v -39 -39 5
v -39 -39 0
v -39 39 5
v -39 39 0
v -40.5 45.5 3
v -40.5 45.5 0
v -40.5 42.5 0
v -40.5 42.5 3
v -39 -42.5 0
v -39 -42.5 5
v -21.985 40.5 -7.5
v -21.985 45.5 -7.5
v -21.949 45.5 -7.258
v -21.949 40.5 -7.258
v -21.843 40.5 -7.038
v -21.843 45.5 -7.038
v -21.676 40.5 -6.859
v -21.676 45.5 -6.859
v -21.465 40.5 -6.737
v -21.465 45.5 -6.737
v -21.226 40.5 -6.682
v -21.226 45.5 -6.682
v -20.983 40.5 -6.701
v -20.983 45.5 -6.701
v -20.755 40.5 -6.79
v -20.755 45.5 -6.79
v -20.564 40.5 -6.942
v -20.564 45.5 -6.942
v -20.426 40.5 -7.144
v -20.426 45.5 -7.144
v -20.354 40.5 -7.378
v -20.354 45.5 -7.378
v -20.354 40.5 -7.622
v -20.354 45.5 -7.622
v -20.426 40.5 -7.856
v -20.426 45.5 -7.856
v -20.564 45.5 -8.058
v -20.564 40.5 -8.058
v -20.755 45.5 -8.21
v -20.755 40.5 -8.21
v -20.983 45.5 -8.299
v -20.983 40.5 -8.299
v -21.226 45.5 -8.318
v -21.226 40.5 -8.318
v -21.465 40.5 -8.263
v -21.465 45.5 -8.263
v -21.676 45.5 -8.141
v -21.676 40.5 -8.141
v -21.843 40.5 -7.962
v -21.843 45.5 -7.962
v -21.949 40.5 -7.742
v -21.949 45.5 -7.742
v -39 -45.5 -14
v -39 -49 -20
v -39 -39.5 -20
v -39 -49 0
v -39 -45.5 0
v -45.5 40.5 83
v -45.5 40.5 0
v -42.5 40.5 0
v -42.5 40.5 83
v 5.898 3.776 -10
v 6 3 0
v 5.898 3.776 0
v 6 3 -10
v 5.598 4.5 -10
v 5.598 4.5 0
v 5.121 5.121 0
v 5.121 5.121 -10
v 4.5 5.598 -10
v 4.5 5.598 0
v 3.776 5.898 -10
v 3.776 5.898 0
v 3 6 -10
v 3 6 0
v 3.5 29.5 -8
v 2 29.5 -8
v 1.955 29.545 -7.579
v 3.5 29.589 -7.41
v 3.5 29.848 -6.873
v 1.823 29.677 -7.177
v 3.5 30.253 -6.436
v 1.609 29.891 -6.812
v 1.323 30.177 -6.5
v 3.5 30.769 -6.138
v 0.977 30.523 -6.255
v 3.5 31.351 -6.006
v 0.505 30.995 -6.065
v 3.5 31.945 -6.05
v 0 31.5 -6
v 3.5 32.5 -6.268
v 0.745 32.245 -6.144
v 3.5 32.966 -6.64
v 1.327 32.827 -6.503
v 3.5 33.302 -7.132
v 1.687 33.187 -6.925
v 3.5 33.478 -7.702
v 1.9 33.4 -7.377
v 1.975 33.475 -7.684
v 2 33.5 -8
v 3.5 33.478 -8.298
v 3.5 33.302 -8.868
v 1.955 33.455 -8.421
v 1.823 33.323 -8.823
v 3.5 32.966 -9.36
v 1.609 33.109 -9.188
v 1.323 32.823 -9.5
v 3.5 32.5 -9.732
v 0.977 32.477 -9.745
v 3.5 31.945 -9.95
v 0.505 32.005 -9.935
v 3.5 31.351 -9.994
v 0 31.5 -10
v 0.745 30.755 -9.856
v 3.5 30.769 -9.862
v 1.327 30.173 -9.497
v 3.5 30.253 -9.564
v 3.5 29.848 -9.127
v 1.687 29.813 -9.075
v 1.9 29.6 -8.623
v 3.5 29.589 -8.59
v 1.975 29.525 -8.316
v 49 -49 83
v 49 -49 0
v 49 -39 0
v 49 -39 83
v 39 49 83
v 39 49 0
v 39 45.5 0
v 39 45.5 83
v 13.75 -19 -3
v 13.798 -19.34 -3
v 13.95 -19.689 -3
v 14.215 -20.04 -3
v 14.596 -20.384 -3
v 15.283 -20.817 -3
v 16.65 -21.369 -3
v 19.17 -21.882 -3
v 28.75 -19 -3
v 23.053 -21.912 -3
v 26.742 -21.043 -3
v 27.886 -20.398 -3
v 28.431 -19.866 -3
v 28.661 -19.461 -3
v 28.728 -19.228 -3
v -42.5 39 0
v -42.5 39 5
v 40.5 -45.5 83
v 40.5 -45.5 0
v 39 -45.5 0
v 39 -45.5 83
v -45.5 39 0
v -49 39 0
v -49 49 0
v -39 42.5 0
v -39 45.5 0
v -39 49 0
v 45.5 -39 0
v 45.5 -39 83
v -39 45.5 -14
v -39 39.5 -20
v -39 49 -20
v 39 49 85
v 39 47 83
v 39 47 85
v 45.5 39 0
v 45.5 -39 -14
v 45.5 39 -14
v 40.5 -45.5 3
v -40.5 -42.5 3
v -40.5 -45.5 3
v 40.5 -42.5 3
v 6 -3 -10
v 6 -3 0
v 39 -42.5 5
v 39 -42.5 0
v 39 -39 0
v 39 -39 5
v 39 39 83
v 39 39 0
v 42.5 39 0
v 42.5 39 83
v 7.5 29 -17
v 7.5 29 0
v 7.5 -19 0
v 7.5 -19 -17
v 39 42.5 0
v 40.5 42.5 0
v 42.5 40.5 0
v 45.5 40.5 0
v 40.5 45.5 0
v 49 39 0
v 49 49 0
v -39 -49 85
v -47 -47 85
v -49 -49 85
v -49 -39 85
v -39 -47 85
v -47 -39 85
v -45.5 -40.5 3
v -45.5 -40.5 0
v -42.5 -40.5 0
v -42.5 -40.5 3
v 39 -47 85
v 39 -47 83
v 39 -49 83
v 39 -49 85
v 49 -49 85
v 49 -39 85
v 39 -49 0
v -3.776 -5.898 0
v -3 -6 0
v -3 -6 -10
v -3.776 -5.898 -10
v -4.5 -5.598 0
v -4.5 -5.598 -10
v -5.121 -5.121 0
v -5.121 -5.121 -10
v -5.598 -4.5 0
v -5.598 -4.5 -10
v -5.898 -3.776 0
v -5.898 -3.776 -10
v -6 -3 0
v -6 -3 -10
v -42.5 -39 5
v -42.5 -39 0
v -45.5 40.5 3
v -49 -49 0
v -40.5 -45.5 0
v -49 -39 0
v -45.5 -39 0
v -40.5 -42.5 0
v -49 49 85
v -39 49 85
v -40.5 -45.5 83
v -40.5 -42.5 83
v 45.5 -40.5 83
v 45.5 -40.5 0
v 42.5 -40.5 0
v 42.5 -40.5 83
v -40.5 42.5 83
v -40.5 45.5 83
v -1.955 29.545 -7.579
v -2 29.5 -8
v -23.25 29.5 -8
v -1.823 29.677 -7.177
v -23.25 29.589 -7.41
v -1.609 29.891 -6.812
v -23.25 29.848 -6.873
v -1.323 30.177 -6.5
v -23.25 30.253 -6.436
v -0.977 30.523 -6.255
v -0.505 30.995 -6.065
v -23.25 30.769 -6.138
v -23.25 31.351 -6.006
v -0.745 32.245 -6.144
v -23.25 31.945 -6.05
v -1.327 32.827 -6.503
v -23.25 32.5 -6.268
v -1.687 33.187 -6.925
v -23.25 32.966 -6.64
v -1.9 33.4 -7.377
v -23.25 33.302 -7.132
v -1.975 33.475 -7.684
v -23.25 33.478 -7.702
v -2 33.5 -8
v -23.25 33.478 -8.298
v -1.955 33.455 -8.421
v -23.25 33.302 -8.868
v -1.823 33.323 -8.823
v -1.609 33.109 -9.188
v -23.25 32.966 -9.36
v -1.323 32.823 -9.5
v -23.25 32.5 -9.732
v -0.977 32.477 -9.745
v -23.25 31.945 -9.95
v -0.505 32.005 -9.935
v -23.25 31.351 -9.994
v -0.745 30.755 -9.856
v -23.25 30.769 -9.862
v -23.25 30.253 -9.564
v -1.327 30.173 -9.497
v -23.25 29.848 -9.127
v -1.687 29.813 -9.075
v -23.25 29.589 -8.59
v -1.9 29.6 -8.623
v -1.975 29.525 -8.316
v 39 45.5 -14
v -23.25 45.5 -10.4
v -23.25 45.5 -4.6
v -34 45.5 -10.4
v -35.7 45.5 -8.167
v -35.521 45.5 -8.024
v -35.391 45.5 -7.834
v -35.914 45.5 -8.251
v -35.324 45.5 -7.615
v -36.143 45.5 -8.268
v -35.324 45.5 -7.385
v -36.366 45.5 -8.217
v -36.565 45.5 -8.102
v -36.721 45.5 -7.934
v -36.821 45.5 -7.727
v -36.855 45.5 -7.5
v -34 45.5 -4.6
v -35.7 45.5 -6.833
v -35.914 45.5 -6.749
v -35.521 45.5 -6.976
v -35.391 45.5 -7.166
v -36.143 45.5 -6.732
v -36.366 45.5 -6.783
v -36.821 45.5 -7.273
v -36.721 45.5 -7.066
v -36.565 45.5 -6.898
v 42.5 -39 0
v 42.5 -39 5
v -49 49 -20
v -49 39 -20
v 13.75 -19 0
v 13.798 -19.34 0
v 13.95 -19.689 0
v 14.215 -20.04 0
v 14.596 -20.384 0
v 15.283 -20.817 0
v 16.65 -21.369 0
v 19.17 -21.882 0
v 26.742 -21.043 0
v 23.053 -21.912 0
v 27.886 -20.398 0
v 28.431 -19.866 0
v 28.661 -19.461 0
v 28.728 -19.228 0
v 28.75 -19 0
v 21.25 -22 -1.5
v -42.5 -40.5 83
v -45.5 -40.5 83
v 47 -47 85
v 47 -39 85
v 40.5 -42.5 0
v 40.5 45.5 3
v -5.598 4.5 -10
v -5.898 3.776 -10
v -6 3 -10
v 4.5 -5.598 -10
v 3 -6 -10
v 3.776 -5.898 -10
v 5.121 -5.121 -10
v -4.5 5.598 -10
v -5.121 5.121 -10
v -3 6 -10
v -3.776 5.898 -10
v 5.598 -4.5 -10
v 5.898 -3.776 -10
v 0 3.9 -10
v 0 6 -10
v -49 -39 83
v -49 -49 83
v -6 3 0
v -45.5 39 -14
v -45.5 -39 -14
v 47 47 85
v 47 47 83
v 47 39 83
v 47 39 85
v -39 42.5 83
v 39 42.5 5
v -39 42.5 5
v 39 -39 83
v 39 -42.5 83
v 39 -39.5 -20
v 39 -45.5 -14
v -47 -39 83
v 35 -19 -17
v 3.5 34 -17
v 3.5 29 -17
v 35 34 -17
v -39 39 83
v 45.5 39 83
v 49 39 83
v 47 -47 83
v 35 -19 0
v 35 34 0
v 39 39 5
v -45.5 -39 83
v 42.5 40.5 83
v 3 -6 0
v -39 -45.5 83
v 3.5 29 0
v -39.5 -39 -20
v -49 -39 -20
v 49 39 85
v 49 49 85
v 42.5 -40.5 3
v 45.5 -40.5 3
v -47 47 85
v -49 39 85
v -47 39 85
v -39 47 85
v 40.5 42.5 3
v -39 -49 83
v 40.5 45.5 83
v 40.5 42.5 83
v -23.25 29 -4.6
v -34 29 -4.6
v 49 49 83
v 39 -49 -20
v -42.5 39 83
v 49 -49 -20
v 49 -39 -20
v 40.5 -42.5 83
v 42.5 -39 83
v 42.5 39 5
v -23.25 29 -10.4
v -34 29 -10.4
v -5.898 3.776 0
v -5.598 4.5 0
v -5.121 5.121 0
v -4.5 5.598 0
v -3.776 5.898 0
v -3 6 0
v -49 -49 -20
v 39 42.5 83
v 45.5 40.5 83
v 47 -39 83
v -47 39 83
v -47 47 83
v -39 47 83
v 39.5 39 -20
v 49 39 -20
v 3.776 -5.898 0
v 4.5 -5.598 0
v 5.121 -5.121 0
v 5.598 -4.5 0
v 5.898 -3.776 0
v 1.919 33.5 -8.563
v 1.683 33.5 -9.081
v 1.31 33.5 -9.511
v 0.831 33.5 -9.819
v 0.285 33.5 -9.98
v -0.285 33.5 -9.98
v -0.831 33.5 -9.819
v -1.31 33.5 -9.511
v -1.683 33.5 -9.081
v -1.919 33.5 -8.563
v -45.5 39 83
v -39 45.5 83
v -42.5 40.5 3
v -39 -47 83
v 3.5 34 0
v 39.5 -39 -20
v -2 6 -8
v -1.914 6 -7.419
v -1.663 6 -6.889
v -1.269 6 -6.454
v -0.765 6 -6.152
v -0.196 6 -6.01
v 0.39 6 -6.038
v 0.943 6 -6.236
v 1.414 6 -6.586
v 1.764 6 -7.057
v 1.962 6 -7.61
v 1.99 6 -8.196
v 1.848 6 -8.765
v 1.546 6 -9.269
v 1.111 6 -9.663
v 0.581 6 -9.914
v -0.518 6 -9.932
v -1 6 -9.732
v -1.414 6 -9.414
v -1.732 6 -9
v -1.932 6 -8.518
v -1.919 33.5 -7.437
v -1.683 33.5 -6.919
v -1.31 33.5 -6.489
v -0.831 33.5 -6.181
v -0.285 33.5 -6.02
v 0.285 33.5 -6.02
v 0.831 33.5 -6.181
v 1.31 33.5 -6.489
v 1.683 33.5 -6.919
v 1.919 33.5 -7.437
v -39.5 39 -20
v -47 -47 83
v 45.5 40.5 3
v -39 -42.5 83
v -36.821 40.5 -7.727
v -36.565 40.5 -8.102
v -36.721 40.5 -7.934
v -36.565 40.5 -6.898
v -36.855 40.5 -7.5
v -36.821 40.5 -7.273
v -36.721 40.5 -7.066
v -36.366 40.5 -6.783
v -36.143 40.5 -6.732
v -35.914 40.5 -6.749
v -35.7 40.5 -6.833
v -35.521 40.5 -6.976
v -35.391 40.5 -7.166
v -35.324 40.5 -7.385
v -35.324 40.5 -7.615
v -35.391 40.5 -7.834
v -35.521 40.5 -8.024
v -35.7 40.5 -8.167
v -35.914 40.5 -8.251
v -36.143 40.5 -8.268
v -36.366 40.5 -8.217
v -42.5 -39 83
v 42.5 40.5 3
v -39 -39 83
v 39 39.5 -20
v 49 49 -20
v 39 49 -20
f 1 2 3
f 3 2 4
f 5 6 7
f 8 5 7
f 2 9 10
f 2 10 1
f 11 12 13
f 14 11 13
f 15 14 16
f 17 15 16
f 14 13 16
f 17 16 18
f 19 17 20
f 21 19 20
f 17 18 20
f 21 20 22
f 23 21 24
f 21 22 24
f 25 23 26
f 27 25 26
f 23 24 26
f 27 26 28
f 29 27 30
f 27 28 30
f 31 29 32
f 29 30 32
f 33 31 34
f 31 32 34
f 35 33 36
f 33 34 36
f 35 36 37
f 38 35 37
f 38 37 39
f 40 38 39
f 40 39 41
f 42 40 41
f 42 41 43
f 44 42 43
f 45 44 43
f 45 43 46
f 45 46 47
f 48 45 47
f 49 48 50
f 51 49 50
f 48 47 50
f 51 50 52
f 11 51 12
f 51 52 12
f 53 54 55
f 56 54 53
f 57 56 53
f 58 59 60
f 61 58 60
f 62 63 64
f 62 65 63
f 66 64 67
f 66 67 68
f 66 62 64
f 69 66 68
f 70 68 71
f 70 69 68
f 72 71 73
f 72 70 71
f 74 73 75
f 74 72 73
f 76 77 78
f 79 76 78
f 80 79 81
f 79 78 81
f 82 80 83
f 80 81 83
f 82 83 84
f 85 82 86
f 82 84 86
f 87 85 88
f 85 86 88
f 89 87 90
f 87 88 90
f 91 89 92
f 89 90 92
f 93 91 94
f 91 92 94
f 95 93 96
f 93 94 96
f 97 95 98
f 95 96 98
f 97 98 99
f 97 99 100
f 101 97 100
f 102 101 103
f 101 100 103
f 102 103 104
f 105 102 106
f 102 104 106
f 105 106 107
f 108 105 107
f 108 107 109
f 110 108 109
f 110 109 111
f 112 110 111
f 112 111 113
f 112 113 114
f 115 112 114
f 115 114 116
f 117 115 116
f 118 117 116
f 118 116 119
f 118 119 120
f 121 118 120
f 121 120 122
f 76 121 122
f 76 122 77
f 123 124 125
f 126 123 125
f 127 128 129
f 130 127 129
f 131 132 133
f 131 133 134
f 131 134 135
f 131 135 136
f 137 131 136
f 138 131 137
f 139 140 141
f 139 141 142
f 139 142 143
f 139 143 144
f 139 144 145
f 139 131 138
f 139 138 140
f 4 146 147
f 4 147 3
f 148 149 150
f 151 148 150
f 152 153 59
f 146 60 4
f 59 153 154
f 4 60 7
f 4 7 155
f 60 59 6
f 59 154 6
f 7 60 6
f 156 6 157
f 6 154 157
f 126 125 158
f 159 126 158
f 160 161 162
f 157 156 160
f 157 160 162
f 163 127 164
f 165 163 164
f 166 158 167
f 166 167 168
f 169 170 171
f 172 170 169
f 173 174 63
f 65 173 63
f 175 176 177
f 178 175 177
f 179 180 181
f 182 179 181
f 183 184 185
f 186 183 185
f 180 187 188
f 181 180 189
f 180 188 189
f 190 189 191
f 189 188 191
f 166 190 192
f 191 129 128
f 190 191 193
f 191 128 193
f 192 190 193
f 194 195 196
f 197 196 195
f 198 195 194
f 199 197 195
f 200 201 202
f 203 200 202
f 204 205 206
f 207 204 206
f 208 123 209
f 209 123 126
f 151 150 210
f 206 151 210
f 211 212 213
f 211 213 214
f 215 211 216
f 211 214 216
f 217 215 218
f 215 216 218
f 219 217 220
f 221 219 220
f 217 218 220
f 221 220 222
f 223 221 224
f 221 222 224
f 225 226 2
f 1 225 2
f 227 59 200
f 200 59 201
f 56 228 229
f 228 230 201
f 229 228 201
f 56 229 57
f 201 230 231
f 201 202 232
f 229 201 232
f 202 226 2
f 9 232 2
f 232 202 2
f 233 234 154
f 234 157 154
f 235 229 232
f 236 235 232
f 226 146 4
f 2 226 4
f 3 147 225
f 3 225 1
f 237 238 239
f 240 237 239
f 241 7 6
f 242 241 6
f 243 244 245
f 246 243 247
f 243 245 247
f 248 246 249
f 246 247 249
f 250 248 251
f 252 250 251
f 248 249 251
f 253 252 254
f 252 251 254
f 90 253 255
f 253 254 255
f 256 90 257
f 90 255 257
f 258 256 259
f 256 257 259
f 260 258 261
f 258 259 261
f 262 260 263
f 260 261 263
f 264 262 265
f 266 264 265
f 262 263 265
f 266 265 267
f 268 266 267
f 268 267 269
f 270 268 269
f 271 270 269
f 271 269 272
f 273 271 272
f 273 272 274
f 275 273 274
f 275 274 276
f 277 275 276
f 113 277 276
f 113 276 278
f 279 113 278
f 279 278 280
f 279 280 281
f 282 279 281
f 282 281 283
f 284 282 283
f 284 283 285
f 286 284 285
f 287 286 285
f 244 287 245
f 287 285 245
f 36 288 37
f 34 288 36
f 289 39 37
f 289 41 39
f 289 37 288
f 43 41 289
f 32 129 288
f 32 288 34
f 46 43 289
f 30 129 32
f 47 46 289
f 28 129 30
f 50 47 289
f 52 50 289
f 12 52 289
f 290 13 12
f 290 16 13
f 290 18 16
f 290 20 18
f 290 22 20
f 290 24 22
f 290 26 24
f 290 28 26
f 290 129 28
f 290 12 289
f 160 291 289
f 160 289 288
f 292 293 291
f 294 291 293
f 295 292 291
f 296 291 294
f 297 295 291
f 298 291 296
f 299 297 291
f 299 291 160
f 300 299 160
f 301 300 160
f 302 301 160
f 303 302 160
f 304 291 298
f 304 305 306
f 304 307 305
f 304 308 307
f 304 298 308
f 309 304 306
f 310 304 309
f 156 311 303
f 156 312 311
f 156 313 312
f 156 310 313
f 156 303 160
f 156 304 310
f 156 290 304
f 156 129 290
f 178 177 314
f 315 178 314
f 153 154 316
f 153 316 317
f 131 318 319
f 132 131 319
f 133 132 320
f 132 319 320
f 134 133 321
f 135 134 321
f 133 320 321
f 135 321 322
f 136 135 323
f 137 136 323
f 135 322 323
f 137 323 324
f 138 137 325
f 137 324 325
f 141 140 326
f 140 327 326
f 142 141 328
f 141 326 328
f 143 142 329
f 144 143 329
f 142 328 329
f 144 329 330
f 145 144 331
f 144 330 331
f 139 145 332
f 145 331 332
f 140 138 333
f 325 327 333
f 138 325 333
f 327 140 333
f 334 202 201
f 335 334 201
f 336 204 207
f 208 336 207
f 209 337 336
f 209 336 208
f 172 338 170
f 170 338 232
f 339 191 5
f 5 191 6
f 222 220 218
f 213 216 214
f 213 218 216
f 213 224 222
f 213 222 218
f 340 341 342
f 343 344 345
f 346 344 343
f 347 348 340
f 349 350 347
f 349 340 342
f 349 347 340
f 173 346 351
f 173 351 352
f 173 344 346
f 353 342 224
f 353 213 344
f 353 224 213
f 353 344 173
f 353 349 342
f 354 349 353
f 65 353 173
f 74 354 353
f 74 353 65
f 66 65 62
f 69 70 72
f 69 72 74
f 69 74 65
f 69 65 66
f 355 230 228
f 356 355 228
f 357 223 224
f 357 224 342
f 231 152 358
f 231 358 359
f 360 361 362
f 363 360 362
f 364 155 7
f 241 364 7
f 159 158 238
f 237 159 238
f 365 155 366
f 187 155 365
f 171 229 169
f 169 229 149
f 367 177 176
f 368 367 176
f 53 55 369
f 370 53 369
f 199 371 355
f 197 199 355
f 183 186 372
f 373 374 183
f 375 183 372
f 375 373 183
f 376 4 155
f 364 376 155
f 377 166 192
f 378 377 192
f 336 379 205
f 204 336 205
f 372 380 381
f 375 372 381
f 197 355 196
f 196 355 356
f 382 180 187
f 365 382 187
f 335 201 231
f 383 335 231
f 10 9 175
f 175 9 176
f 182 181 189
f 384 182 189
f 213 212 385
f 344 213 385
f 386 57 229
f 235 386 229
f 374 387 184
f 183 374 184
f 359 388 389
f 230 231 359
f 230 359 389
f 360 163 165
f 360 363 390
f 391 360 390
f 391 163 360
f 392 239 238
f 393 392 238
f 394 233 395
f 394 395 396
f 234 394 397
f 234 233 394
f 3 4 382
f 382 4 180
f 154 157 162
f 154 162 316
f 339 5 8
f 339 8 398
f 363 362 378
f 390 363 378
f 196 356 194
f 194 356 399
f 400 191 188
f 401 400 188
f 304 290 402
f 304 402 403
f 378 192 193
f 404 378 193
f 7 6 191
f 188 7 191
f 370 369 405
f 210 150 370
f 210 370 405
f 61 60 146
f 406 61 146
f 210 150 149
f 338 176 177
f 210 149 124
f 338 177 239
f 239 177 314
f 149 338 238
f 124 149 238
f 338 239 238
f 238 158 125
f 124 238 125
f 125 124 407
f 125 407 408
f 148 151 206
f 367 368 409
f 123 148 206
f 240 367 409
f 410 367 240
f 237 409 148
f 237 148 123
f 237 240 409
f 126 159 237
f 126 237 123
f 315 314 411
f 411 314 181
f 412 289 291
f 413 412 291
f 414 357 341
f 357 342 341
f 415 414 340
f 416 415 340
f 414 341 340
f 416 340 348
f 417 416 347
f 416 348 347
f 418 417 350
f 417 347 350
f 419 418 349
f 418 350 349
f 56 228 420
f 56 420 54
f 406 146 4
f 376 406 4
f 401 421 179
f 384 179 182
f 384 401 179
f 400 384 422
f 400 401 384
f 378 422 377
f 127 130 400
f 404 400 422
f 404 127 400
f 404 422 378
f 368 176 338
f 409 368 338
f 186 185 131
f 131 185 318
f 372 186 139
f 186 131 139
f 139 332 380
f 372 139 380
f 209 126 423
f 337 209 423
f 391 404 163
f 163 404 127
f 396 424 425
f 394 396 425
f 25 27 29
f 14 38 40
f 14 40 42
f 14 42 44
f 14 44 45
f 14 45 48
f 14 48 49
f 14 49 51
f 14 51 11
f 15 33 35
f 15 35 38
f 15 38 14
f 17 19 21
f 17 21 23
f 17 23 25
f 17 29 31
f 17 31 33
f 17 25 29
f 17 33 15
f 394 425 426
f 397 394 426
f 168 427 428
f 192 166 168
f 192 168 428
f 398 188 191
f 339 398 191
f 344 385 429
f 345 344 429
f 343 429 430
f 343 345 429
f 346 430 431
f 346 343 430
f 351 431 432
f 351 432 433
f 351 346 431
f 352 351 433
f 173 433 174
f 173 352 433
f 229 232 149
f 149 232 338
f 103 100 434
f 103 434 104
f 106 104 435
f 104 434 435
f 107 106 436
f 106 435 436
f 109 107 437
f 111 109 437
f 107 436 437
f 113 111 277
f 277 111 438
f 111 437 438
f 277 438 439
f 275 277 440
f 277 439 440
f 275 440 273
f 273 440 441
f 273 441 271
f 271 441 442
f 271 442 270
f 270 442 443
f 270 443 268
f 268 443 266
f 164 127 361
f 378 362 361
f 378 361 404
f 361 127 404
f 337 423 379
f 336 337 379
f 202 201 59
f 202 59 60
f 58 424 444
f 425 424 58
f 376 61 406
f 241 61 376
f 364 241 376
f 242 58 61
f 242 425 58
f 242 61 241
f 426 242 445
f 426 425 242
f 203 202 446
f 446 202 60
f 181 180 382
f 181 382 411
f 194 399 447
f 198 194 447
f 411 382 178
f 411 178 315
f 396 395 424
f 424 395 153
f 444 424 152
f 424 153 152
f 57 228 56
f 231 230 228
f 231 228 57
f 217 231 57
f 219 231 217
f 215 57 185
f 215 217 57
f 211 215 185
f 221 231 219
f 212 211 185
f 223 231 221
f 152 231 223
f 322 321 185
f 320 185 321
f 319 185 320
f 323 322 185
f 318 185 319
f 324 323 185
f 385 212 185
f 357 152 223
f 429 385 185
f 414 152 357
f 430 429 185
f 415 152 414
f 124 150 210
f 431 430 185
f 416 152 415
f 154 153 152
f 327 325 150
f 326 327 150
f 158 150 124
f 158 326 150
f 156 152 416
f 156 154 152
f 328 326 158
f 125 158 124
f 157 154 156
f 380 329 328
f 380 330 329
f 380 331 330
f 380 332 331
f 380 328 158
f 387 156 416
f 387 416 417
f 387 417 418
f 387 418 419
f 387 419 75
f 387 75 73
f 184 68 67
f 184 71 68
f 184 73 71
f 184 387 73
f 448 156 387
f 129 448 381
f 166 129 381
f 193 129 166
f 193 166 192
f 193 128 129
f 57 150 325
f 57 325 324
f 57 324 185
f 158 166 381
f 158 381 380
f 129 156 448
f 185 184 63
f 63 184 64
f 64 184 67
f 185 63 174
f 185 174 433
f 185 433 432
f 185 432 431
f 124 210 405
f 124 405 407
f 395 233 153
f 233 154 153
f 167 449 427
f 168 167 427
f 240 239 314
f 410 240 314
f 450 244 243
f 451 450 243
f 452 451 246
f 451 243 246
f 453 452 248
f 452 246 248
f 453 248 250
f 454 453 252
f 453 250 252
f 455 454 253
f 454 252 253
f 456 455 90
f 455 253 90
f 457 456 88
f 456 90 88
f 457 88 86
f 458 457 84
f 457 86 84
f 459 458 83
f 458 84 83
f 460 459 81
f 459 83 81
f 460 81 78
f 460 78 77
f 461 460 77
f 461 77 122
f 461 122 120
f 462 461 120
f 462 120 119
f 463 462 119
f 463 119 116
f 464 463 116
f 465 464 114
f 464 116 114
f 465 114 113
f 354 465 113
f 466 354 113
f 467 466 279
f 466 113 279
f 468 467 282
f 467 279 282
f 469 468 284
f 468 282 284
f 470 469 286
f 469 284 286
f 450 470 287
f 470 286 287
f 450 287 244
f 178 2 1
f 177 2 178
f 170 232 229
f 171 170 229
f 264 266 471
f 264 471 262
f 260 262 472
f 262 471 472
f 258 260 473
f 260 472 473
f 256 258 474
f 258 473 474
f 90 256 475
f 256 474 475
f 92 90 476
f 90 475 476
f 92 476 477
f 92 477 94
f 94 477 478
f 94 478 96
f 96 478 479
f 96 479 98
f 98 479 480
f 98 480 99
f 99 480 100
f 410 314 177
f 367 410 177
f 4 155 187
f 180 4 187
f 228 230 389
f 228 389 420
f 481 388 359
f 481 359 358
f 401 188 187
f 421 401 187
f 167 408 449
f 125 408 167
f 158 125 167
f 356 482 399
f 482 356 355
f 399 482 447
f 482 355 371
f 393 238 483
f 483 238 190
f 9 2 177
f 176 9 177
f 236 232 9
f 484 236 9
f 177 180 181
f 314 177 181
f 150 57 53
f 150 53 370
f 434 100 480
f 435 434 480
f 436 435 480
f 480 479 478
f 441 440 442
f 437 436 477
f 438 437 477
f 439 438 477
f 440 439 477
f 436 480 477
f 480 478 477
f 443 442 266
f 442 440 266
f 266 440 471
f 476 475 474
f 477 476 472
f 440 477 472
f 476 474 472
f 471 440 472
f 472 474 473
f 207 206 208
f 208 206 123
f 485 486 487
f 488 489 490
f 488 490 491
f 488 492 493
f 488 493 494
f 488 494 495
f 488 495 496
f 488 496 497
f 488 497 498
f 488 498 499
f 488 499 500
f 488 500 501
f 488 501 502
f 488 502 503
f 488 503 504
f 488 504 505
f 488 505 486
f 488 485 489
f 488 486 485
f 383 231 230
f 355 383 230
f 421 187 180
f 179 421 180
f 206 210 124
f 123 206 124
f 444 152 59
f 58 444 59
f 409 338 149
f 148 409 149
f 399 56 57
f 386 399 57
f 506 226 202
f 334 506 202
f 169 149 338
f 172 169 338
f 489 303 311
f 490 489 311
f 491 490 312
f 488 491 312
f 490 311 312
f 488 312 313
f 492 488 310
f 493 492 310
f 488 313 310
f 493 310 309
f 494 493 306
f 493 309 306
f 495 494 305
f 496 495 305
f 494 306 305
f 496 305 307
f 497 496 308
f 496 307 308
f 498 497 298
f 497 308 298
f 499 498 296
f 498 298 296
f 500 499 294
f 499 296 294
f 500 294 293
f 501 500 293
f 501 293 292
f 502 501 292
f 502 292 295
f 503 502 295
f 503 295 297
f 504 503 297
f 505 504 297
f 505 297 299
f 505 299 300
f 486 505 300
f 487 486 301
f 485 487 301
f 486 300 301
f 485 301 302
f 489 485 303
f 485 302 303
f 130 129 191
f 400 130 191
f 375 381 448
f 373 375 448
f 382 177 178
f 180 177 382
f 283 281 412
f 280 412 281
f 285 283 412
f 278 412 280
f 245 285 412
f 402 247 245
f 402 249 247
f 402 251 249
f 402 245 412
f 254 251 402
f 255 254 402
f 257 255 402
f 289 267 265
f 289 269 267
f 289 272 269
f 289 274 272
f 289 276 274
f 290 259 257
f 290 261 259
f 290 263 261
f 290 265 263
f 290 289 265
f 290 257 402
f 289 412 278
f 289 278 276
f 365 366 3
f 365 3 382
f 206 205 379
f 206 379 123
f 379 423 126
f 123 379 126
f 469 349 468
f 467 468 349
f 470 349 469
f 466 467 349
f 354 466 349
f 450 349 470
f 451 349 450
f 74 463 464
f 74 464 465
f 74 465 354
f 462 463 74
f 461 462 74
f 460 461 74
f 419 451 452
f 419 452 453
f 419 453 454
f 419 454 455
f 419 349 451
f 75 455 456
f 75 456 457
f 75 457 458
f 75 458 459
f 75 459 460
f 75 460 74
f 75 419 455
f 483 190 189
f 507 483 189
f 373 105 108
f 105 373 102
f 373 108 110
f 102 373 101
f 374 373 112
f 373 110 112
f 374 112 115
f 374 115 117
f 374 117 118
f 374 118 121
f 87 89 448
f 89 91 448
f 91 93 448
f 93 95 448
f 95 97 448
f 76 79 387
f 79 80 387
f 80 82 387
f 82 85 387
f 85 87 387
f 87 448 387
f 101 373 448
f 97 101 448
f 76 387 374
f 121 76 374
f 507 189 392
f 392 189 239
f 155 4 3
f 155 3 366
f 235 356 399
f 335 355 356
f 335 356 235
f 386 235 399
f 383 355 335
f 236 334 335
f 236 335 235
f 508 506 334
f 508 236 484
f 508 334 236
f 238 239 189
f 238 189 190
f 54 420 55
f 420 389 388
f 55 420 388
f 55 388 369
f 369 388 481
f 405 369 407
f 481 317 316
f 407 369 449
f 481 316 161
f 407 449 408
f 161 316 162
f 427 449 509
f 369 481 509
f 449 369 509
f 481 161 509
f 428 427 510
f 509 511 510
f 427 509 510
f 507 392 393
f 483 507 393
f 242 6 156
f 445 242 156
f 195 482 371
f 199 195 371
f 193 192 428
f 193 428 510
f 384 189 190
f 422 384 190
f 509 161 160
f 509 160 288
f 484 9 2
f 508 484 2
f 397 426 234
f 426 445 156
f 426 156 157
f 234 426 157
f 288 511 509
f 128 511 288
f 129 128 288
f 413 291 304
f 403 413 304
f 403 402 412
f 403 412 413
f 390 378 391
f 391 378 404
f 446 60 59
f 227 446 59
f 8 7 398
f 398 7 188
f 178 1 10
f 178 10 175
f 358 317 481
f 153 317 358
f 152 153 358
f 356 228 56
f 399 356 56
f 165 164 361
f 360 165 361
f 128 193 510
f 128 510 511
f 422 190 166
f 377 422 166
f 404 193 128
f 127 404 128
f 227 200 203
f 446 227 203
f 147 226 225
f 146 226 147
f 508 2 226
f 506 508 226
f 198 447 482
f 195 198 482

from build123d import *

# Parameters (mm, degrees)
F0_W      = 3.5
F0_H      = 78
F1_DEPTH  = 5
F0_W_2    = 78
F0_H_2    = 3.5
F2_DEPTH  = 83
F0_W_3    = 1.5
F0_H_3    = 1.5
F3_DEPTH  = 3
F4_DEPTH  = 20
F6_DEPTH  = 17
F5_W      = 12
F5_H      = 12
F7_DEPTH  = 10
F8_DEPTH  = 3
F9_R      = 3
F10_SIZE  = 6
F15_DEPTH = 2
F16_W     = 10.75
F16_H     = 5.8
F17_DEPTH = 16.5
F16_R     = 0.82
F16_R_2   = 0.77
F18_DEPTH = 5
F19_R     = 2
F20_DEPTH = 50
F21_DEPTH = 11.5
F16_R_3   = 2
F22_DEPTH = 41.6
F23_DEPTH = 12


with BuildPart() as f1:
    # F0 (on Top) → F1 (new body)
    with BuildSketch(Plane.XY):
        with Locations((-40.75, 0)):
            Rectangle(F0_W, F0_H)
    extrude(amount=F1_DEPTH)


with BuildPart() as f1b:
    # F0 (on Top) → F1, piece 2 (new body)
    with BuildSketch(Plane.XY):
        with Locations((0, 40.75)):
            Rectangle(F0_W_2, F0_H_2)
    extrude(amount=F1_DEPTH)


with BuildPart() as f1c:
    # F0 (on Top) → F1, piece 3 (new body)
    with BuildSketch(Plane.XY):
        with Locations((40.75, 0)):
            Rectangle(F0_W, F0_H)
    extrude(amount=F1_DEPTH)


with BuildPart() as f1d:
    # F0 (on Top) → F1, piece 4 (new body)
    with BuildSketch(Plane.XY):
        with Locations((0, -40.75)):
            Rectangle(F0_W_2, F0_H_2)
    extrude(amount=F1_DEPTH)


with BuildPart() as f2:
    # F0 (on Top) → F2 (new body)
    with BuildSketch(Plane.XY):
        Polygon((-39, 39), (-39, 42.5), (-40.5, 42.5), (-42.5, 42.5), (-42.5, 40.5), (-42.5, 39), align=None)
        Polygon((-40.5, 42.5), (-40.5, 44), (-44, 44), (-44, 40.5), (-42.5, 40.5), (-42.5, 42.5), align=None)
        Polygon((-44, 44), (-40.5, 44), (-40.5, 45.5), (-45.5, 45.5), (-45.5, 40.5), (-44, 40.5), align=None)
        Polygon((-40.5, 45.5), (-39, 45.5), (-39, 49), (-49, 49), (-49, 39), (-45.5, 39), (-45.5, 40.5), (-45.5, 45.5), align=None)
    extrude(amount=F2_DEPTH)

    # F12 (on face) → F15 (join)
    with BuildSketch(Plane.XY.offset(83)):
        Polygon((-47, 47), (-39, 47), (-39, 49), (-49, 49), (-49, 39), (-47, 39), align=None)
    extrude(amount=F15_DEPTH)


with BuildPart() as f2b:
    # F0 (on Top) → F2, piece 2 (new body)
    with BuildSketch(Plane.XY):
        Polygon((39, 45.5), (40.5, 45.5), (45.5, 45.5), (45.5, 40.5), (45.5, 39), (49, 39), (49, 49), (39, 49), align=None)
        Polygon((40.5, 44), (44, 44), (44, 40.5), (45.5, 40.5), (45.5, 45.5), (40.5, 45.5), align=None)
        Polygon((44, 40.5), (44, 44), (40.5, 44), (40.5, 42.5), (42.5, 42.5), (42.5, 40.5), align=None)
        Polygon((42.5, 42.5), (40.5, 42.5), (39, 42.5), (39, 39), (42.5, 39), (42.5, 40.5), align=None)
    extrude(amount=F2_DEPTH)


with BuildPart() as f2c:
    # F0 (on Top) → F2, piece 3 (new body)
    with BuildSketch(Plane.XY):
        Polygon((49, -39), (45.5, -39), (45.5, -40.5), (45.5, -45.5), (40.5, -45.5), (39, -45.5), (39, -49), (49, -49), align=None)
        Polygon((45.5, -40.5), (44, -40.5), (44, -44), (40.5, -44), (40.5, -45.5), (45.5, -45.5), align=None)
        Polygon((44, -44), (44, -40.5), (42.5, -40.5), (42.5, -42.5), (40.5, -42.5), (40.5, -44), align=None)
        Polygon((42.5, -40.5), (42.5, -39), (39, -39), (39, -42.5), (40.5, -42.5), (42.5, -42.5), align=None)
    extrude(amount=F2_DEPTH)


with BuildPart() as f2d:
    # F0 (on Top) → F2, piece 4 (new body)
    with BuildSketch(Plane.XY):
        Polygon((-39, -42.5), (-39, -39), (-42.5, -39), (-42.5, -40.5), (-42.5, -42.5), (-40.5, -42.5), align=None)
        Polygon((-42.5, -42.5), (-42.5, -40.5), (-44, -40.5), (-44, -44), (-40.5, -44), (-40.5, -42.5), align=None)
        Polygon((-44, -44), (-44, -40.5), (-45.5, -40.5), (-45.5, -45.5), (-40.5, -45.5), (-40.5, -44), align=None)
        Polygon((-45.5, -40.5), (-45.5, -39), (-49, -39), (-49, -49), (-39, -49), (-39, -45.5), (-40.5, -45.5), (-45.5, -45.5), align=None)
    extrude(amount=F2_DEPTH)


with BuildPart() as f3:
    # F0 (on Top) → F3 (new body)
    with BuildSketch(Plane.XY):
        with Locations((-43.25, 0)):
            Rectangle(F0_W_3, F0_H)
        with Locations((-44.75, 0)):
            Rectangle(F0_W_3, F0_H)
        with Locations((-43.25, 39.75)):
            Rectangle(F0_W_3, F0_H_3)
        with Locations((-44.75, 39.75)):
            Rectangle(F0_W_3, F0_H_3)
        with Locations((-43.25, -39.75)):
            Rectangle(F0_W_3, F0_H_3)
        with Locations((-44.75, -39.75)):
            Rectangle(F0_W_3, F0_H_3)
    extrude(amount=F3_DEPTH)


with BuildPart() as f3b:
    # F0 (on Top) → F3, piece 2 (new body)
    with BuildSketch(Plane.XY):
        with Locations((0, -43.25)):
            Rectangle(F0_W_2, F0_H_3)
        with Locations((-39.75, -43.25)):
            Rectangle(F0_W_3, F0_H_3)
        with Locations((-39.75, -44.75)):
            Rectangle(F0_W_3, F0_H_3)
        with Locations((0, -44.75)):
            Rectangle(F0_W_2, F0_H_3)
        with Locations((39.75, -44.75)):
            Rectangle(F0_W_3, F0_H_3)
        with Locations((39.75, -43.25)):
            Rectangle(F0_W_3, F0_H_3)
    extrude(amount=F3_DEPTH)


with BuildPart() as f3c:
    # F0 (on Top) → F3, piece 3 (new body)
    with BuildSketch(Plane.XY):
        with Locations((43.25, -39.75)):
            Rectangle(F0_W_3, F0_H_3)
        with Locations((44.75, -39.75)):
            Rectangle(F0_W_3, F0_H_3)
        with Locations((44.75, 0)):
            Rectangle(F0_W_3, F0_H)
        with Locations((43.25, 0)):
            Rectangle(F0_W_3, F0_H)
        with Locations((44.75, 39.75)):
            Rectangle(F0_W_3, F0_H_3)
        with Locations((43.25, 39.75)):
            Rectangle(F0_W_3, F0_H_3)
    extrude(amount=F3_DEPTH)


with BuildPart() as f3d:
    # F0 (on Top) → F3, piece 4 (new body)
    with BuildSketch(Plane.XY):
        with Locations((39.75, 43.25)):
            Rectangle(F0_W_3, F0_H_3)
        with Locations((39.75, 44.75)):
            Rectangle(F0_W_3, F0_H_3)
        with Locations((0, 44.75)):
            Rectangle(F0_W_2, F0_H_3)
        with Locations((0, 43.25)):
            Rectangle(F0_W_2, F0_H_3)
        with Locations((-39.75, 43.25)):
            Rectangle(F0_W_3, F0_H_3)
        with Locations((-39.75, 44.75)):
            Rectangle(F0_W_3, F0_H_3)
    extrude(amount=F3_DEPTH)


with BuildPart() as f4:
    # F0 (on Top) → F4 (new body)
    with BuildSketch(Plane.XY):
        with Locations((0, 44.75)):
            Rectangle(F0_W_2, F0_H_3)
        with Locations((0, -44.75)):
            Rectangle(F0_W_2, F0_H_3)
        with Locations((44.75, 0)):
            Rectangle(F0_W_3, F0_H)
        with Locations((-44.75, 0)):
            Rectangle(F0_W_3, F0_H)
        Polygon((39, 45.5), (40.5, 45.5), (45.5, 45.5), (45.5, 40.5), (45.5, 39), (49, 39), (49, 49), (39, 49), align=None)
        Polygon((49, -39), (45.5, -39), (45.5, -40.5), (45.5, -45.5), (40.5, -45.5), (39, -45.5), (39, -49), (49, -49), align=None)
        Polygon((-45.5, -40.5), (-45.5, -39), (-49, -39), (-49, -49), (-39, -49), (-39, -45.5), (-40.5, -45.5), (-45.5, -45.5), align=None)
        Polygon((-40.5, 45.5), (-39, 45.5), (-39, 49), (-49, 49), (-49, 39), (-45.5, 39), (-45.5, 40.5), (-45.5, 45.5), align=None)
        with Locations((39.75, 44.75)):
            Rectangle(F0_W_3, F0_H_3)
        with Locations((-39.75, 44.75)):
            Rectangle(F0_W_3, F0_H_3)
        with Locations((39.75, -44.75)):
            Rectangle(F0_W_3, F0_H_3)
        with Locations((-39.75, -44.75)):
            Rectangle(F0_W_3, F0_H_3)
        with Locations((44.75, 39.75)):
            Rectangle(F0_W_3, F0_H_3)
        with Locations((44.75, -39.75)):
            Rectangle(F0_W_3, F0_H_3)
        with Locations((-44.75, 39.75)):
            Rectangle(F0_W_3, F0_H_3)
        with Locations((-44.75, -39.75)):
            Rectangle(F0_W_3, F0_H_3)
        with Locations((40.75, 0)):
            Rectangle(F0_W, F0_H)
        with Locations((0, -43.25)):
            Rectangle(F0_W_2, F0_H_3)
        with Locations((0, 40.75)):
            Rectangle(F0_W_2, F0_H_2)
        with Locations((0, -40.75)):
            Rectangle(F0_W_2, F0_H_2)
        with Locations((0, 43.25)):
            Rectangle(F0_W_2, F0_H_3)
        with Locations((-40.75, 0)):
            Rectangle(F0_W, F0_H)
        Rectangle(F0_W_2, F0_H)
        Polygon((42.5, -40.5), (42.5, -39), (39, -39), (39, -42.5), (40.5, -42.5), (42.5, -42.5), align=None)
        with Locations((43.25, 39.75)):
            Rectangle(F0_W_3, F0_H_3)
        Polygon((-39, -42.5), (-39, -39), (-42.5, -39), (-42.5, -40.5), (-42.5, -42.5), (-40.5, -42.5), align=None)
        Polygon((-39, 39), (-39, 42.5), (-40.5, 42.5), (-42.5, 42.5), (-42.5, 40.5), (-42.5, 39), align=None)
        with Locations((43.25, 0)):
            Rectangle(F0_W_3, F0_H)
        Polygon((-44, 44), (-40.5, 44), (-40.5, 45.5), (-45.5, 45.5), (-45.5, 40.5), (-44, 40.5), align=None)
        Polygon((40.5, 44), (44, 44), (44, 40.5), (45.5, 40.5), (45.5, 45.5), (40.5, 45.5), align=None)
        Polygon((45.5, -40.5), (44, -40.5), (44, -44), (40.5, -44), (40.5, -45.5), (45.5, -45.5), align=None)
        with Locations((-43.25, 0)):
            Rectangle(F0_W_3, F0_H)
        Polygon((-44, -44), (-44, -40.5), (-45.5, -40.5), (-45.5, -45.5), (-40.5, -45.5), (-40.5, -44), align=None)
        with Locations((-43.25, -39.75)):
            Rectangle(F0_W_3, F0_H_3)
        with Locations((-43.25, 39.75)):
            Rectangle(F0_W_3, F0_H_3)
        Polygon((42.5, 42.5), (40.5, 42.5), (39, 42.5), (39, 39), (42.5, 39), (42.5, 40.5), align=None)
        with Locations((39.75, -43.25)):
            Rectangle(F0_W_3, F0_H_3)
        with Locations((43.25, -39.75)):
            Rectangle(F0_W_3, F0_H_3)
        with Locations((-39.75, -43.25)):
            Rectangle(F0_W_3, F0_H_3)
        with Locations((-39.75, 43.25)):
            Rectangle(F0_W_3, F0_H_3)
        Polygon((-40.5, 42.5), (-40.5, 44), (-44, 44), (-44, 40.5), (-42.5, 40.5), (-42.5, 42.5), align=None)
        Polygon((44, 40.5), (44, 44), (40.5, 44), (40.5, 42.5), (42.5, 42.5), (42.5, 40.5), align=None)
        with Locations((39.75, 43.25)):
            Rectangle(F0_W_3, F0_H_3)
        Polygon((44, -44), (44, -40.5), (42.5, -40.5), (42.5, -42.5), (40.5, -42.5), (40.5, -44), align=None)
        Polygon((-42.5, -42.5), (-42.5, -40.5), (-44, -40.5), (-44, -44), (-40.5, -44), (-40.5, -42.5), align=None)
    extrude(amount=-F4_DEPTH)

    # F5 (on face) → F6 (cut)
    with BuildSketch(Plane.XY):
        Polygon((35, 34), (7.5, 34), (3.5, 34), (3.5, 29), (7.5, 29), (7.5, -19), (13.75, -19), (28.75, -19), (35, -19), align=None)
    extrude(amount=-F6_DEPTH, mode=Mode.SUBTRACT)

    # F5 (on face) → F7 (cut)
    with BuildSketch(Plane.XY):
        Rectangle(F5_W, F5_H)
    extrude(amount=-F7_DEPTH, mode=Mode.SUBTRACT)

    # F5 (on face) → F8 (cut)
    with BuildSketch(Plane.XY):
        with BuildLine():
            add(Edge.make_bspline(
                [(13.75, -19), (13.75, -22), (21.25, -22), (28.75, -22), (28.75, -19)],
                knots=[3.1415926536, 3.1415926536, 3.1415926536, 4.7123889804, 4.7123889804, 6.2831853072, 6.2831853072, 6.2831853072], degree=2, weights=[1, 0.7071067812, 1, 0.7071067812, 1]))
            Line((28.75, -19), (13.75, -19))
        make_face()
    extrude(amount=-F8_DEPTH, mode=Mode.SUBTRACT)

    # F9
    f9_edges = [f4.edges().sort_by_distance(p)[0] for p in [
        (6, 6, -5),
        (6, -6, -5),
        (-6, -6, -5),
        (-6, 6, -5),
    ]]
    fillet(f9_edges, radius=F9_R)

    # F10
    f10_edges = [f4.edges().sort_by_distance(p)[0] for p in [
        (0, 45.5, -20),
        (-45.5, 0, -20),
        (0, -45.5, -20),
        (45.5, 0, -20),
    ]]
    chamfer(f10_edges, length=F10_SIZE)

    # F16 (on face) → F17 (cut)
    with BuildSketch(Plane(origin=(0, 45.5, 0), x_dir=(-1, 0, 0), z_dir=(0, 1, 0))):
        with Locations((28.625, -7.5)):
            Rectangle(F16_W, F16_H)
    extrude(amount=-F17_DEPTH, mode=Mode.SUBTRACT)

    # F16 (on face) → F18 (cut)
    with BuildSketch(Plane(origin=(0, 45.5, 0), x_dir=(-1, 0, 0), z_dir=(0, 1, 0))):
        with Locations((21.165, -7.5)):
            Circle(F16_R)
        with Locations((36.085, -7.5)):
            Circle(F16_R_2)
    extrude(amount=-F18_DEPTH, mode=Mode.SUBTRACT)

    # F19 (on face) → F20 (cut)
    with BuildSketch(Plane(origin=(-45.5, 0, 0), x_dir=(0, -1, 0), z_dir=(-1, 0, 0))):
        with Locations((-31.5, -8)):
            Circle(F19_R)
    extrude(amount=-F20_DEPTH, mode=Mode.SUBTRACT)

    # F19 (on face) → F21 (join)
    with BuildSketch(Plane(origin=(-45.5, 0, 0), x_dir=(0, -1, 0), z_dir=(-1, 0, 0))):
        with Locations((-31.5, -8)):
            Circle(F19_R)
    extrude(amount=-F21_DEPTH)

    # F16 (on face) → F22 (cut)
    with BuildSketch(Plane(origin=(0, 45.5, 0), x_dir=(-1, 0, 0), z_dir=(0, 1, 0))):
        with Locations((0, -8)):
            Circle(F16_R_3)
    extrude(amount=-F22_DEPTH, mode=Mode.SUBTRACT)

    # F16 (on face) → F23 (join)
    with BuildSketch(Plane(origin=(0, 45.5, 0), x_dir=(-1, 0, 0), z_dir=(0, 1, 0))):
        with Locations((0, -8)):
            Circle(F16_R_3)
    extrude(amount=-F23_DEPTH)


with BuildPart() as f15:
    # F11 (on face) → F15, piece 2 (new body)
    with BuildSketch(Plane.XY.offset(83)):
        Polygon((39, 49), (39, 46.9999983907), (46.9999983907, 46.9999983907), (46.9999983907, 39), (49, 39), (49, 49), align=None)
    extrude(amount=F15_DEPTH)


with BuildPart() as f15b:
    # F14 (on face) → F15, piece 3 (new body)
    with BuildSketch(Plane.XY.offset(83)):
        Polygon((47, -39), (47, -47), (39, -47), (39, -49), (49, -49), (49, -39), align=None)
    extrude(amount=F15_DEPTH)


with BuildPart() as f15c:
    # F13 (on face) → F15, piece 4 (new body)
    with BuildSketch(Plane.XY.offset(83)):
        Polygon((-39, -49), (-39, -47), (-47, -47), (-47, -39), (-49, -39), (-49, -49), align=None)
    extrude(amount=F15_DEPTH)


solid = Compound([f1.part, f1b.part, f1c.part, f1d.part, f2.part, f2b.part, f2c.part, f2d.part, f3.part, f3b.part, f3c.part, f3d.part, f4.part, f15.part, f15b.part, f15c.part])
